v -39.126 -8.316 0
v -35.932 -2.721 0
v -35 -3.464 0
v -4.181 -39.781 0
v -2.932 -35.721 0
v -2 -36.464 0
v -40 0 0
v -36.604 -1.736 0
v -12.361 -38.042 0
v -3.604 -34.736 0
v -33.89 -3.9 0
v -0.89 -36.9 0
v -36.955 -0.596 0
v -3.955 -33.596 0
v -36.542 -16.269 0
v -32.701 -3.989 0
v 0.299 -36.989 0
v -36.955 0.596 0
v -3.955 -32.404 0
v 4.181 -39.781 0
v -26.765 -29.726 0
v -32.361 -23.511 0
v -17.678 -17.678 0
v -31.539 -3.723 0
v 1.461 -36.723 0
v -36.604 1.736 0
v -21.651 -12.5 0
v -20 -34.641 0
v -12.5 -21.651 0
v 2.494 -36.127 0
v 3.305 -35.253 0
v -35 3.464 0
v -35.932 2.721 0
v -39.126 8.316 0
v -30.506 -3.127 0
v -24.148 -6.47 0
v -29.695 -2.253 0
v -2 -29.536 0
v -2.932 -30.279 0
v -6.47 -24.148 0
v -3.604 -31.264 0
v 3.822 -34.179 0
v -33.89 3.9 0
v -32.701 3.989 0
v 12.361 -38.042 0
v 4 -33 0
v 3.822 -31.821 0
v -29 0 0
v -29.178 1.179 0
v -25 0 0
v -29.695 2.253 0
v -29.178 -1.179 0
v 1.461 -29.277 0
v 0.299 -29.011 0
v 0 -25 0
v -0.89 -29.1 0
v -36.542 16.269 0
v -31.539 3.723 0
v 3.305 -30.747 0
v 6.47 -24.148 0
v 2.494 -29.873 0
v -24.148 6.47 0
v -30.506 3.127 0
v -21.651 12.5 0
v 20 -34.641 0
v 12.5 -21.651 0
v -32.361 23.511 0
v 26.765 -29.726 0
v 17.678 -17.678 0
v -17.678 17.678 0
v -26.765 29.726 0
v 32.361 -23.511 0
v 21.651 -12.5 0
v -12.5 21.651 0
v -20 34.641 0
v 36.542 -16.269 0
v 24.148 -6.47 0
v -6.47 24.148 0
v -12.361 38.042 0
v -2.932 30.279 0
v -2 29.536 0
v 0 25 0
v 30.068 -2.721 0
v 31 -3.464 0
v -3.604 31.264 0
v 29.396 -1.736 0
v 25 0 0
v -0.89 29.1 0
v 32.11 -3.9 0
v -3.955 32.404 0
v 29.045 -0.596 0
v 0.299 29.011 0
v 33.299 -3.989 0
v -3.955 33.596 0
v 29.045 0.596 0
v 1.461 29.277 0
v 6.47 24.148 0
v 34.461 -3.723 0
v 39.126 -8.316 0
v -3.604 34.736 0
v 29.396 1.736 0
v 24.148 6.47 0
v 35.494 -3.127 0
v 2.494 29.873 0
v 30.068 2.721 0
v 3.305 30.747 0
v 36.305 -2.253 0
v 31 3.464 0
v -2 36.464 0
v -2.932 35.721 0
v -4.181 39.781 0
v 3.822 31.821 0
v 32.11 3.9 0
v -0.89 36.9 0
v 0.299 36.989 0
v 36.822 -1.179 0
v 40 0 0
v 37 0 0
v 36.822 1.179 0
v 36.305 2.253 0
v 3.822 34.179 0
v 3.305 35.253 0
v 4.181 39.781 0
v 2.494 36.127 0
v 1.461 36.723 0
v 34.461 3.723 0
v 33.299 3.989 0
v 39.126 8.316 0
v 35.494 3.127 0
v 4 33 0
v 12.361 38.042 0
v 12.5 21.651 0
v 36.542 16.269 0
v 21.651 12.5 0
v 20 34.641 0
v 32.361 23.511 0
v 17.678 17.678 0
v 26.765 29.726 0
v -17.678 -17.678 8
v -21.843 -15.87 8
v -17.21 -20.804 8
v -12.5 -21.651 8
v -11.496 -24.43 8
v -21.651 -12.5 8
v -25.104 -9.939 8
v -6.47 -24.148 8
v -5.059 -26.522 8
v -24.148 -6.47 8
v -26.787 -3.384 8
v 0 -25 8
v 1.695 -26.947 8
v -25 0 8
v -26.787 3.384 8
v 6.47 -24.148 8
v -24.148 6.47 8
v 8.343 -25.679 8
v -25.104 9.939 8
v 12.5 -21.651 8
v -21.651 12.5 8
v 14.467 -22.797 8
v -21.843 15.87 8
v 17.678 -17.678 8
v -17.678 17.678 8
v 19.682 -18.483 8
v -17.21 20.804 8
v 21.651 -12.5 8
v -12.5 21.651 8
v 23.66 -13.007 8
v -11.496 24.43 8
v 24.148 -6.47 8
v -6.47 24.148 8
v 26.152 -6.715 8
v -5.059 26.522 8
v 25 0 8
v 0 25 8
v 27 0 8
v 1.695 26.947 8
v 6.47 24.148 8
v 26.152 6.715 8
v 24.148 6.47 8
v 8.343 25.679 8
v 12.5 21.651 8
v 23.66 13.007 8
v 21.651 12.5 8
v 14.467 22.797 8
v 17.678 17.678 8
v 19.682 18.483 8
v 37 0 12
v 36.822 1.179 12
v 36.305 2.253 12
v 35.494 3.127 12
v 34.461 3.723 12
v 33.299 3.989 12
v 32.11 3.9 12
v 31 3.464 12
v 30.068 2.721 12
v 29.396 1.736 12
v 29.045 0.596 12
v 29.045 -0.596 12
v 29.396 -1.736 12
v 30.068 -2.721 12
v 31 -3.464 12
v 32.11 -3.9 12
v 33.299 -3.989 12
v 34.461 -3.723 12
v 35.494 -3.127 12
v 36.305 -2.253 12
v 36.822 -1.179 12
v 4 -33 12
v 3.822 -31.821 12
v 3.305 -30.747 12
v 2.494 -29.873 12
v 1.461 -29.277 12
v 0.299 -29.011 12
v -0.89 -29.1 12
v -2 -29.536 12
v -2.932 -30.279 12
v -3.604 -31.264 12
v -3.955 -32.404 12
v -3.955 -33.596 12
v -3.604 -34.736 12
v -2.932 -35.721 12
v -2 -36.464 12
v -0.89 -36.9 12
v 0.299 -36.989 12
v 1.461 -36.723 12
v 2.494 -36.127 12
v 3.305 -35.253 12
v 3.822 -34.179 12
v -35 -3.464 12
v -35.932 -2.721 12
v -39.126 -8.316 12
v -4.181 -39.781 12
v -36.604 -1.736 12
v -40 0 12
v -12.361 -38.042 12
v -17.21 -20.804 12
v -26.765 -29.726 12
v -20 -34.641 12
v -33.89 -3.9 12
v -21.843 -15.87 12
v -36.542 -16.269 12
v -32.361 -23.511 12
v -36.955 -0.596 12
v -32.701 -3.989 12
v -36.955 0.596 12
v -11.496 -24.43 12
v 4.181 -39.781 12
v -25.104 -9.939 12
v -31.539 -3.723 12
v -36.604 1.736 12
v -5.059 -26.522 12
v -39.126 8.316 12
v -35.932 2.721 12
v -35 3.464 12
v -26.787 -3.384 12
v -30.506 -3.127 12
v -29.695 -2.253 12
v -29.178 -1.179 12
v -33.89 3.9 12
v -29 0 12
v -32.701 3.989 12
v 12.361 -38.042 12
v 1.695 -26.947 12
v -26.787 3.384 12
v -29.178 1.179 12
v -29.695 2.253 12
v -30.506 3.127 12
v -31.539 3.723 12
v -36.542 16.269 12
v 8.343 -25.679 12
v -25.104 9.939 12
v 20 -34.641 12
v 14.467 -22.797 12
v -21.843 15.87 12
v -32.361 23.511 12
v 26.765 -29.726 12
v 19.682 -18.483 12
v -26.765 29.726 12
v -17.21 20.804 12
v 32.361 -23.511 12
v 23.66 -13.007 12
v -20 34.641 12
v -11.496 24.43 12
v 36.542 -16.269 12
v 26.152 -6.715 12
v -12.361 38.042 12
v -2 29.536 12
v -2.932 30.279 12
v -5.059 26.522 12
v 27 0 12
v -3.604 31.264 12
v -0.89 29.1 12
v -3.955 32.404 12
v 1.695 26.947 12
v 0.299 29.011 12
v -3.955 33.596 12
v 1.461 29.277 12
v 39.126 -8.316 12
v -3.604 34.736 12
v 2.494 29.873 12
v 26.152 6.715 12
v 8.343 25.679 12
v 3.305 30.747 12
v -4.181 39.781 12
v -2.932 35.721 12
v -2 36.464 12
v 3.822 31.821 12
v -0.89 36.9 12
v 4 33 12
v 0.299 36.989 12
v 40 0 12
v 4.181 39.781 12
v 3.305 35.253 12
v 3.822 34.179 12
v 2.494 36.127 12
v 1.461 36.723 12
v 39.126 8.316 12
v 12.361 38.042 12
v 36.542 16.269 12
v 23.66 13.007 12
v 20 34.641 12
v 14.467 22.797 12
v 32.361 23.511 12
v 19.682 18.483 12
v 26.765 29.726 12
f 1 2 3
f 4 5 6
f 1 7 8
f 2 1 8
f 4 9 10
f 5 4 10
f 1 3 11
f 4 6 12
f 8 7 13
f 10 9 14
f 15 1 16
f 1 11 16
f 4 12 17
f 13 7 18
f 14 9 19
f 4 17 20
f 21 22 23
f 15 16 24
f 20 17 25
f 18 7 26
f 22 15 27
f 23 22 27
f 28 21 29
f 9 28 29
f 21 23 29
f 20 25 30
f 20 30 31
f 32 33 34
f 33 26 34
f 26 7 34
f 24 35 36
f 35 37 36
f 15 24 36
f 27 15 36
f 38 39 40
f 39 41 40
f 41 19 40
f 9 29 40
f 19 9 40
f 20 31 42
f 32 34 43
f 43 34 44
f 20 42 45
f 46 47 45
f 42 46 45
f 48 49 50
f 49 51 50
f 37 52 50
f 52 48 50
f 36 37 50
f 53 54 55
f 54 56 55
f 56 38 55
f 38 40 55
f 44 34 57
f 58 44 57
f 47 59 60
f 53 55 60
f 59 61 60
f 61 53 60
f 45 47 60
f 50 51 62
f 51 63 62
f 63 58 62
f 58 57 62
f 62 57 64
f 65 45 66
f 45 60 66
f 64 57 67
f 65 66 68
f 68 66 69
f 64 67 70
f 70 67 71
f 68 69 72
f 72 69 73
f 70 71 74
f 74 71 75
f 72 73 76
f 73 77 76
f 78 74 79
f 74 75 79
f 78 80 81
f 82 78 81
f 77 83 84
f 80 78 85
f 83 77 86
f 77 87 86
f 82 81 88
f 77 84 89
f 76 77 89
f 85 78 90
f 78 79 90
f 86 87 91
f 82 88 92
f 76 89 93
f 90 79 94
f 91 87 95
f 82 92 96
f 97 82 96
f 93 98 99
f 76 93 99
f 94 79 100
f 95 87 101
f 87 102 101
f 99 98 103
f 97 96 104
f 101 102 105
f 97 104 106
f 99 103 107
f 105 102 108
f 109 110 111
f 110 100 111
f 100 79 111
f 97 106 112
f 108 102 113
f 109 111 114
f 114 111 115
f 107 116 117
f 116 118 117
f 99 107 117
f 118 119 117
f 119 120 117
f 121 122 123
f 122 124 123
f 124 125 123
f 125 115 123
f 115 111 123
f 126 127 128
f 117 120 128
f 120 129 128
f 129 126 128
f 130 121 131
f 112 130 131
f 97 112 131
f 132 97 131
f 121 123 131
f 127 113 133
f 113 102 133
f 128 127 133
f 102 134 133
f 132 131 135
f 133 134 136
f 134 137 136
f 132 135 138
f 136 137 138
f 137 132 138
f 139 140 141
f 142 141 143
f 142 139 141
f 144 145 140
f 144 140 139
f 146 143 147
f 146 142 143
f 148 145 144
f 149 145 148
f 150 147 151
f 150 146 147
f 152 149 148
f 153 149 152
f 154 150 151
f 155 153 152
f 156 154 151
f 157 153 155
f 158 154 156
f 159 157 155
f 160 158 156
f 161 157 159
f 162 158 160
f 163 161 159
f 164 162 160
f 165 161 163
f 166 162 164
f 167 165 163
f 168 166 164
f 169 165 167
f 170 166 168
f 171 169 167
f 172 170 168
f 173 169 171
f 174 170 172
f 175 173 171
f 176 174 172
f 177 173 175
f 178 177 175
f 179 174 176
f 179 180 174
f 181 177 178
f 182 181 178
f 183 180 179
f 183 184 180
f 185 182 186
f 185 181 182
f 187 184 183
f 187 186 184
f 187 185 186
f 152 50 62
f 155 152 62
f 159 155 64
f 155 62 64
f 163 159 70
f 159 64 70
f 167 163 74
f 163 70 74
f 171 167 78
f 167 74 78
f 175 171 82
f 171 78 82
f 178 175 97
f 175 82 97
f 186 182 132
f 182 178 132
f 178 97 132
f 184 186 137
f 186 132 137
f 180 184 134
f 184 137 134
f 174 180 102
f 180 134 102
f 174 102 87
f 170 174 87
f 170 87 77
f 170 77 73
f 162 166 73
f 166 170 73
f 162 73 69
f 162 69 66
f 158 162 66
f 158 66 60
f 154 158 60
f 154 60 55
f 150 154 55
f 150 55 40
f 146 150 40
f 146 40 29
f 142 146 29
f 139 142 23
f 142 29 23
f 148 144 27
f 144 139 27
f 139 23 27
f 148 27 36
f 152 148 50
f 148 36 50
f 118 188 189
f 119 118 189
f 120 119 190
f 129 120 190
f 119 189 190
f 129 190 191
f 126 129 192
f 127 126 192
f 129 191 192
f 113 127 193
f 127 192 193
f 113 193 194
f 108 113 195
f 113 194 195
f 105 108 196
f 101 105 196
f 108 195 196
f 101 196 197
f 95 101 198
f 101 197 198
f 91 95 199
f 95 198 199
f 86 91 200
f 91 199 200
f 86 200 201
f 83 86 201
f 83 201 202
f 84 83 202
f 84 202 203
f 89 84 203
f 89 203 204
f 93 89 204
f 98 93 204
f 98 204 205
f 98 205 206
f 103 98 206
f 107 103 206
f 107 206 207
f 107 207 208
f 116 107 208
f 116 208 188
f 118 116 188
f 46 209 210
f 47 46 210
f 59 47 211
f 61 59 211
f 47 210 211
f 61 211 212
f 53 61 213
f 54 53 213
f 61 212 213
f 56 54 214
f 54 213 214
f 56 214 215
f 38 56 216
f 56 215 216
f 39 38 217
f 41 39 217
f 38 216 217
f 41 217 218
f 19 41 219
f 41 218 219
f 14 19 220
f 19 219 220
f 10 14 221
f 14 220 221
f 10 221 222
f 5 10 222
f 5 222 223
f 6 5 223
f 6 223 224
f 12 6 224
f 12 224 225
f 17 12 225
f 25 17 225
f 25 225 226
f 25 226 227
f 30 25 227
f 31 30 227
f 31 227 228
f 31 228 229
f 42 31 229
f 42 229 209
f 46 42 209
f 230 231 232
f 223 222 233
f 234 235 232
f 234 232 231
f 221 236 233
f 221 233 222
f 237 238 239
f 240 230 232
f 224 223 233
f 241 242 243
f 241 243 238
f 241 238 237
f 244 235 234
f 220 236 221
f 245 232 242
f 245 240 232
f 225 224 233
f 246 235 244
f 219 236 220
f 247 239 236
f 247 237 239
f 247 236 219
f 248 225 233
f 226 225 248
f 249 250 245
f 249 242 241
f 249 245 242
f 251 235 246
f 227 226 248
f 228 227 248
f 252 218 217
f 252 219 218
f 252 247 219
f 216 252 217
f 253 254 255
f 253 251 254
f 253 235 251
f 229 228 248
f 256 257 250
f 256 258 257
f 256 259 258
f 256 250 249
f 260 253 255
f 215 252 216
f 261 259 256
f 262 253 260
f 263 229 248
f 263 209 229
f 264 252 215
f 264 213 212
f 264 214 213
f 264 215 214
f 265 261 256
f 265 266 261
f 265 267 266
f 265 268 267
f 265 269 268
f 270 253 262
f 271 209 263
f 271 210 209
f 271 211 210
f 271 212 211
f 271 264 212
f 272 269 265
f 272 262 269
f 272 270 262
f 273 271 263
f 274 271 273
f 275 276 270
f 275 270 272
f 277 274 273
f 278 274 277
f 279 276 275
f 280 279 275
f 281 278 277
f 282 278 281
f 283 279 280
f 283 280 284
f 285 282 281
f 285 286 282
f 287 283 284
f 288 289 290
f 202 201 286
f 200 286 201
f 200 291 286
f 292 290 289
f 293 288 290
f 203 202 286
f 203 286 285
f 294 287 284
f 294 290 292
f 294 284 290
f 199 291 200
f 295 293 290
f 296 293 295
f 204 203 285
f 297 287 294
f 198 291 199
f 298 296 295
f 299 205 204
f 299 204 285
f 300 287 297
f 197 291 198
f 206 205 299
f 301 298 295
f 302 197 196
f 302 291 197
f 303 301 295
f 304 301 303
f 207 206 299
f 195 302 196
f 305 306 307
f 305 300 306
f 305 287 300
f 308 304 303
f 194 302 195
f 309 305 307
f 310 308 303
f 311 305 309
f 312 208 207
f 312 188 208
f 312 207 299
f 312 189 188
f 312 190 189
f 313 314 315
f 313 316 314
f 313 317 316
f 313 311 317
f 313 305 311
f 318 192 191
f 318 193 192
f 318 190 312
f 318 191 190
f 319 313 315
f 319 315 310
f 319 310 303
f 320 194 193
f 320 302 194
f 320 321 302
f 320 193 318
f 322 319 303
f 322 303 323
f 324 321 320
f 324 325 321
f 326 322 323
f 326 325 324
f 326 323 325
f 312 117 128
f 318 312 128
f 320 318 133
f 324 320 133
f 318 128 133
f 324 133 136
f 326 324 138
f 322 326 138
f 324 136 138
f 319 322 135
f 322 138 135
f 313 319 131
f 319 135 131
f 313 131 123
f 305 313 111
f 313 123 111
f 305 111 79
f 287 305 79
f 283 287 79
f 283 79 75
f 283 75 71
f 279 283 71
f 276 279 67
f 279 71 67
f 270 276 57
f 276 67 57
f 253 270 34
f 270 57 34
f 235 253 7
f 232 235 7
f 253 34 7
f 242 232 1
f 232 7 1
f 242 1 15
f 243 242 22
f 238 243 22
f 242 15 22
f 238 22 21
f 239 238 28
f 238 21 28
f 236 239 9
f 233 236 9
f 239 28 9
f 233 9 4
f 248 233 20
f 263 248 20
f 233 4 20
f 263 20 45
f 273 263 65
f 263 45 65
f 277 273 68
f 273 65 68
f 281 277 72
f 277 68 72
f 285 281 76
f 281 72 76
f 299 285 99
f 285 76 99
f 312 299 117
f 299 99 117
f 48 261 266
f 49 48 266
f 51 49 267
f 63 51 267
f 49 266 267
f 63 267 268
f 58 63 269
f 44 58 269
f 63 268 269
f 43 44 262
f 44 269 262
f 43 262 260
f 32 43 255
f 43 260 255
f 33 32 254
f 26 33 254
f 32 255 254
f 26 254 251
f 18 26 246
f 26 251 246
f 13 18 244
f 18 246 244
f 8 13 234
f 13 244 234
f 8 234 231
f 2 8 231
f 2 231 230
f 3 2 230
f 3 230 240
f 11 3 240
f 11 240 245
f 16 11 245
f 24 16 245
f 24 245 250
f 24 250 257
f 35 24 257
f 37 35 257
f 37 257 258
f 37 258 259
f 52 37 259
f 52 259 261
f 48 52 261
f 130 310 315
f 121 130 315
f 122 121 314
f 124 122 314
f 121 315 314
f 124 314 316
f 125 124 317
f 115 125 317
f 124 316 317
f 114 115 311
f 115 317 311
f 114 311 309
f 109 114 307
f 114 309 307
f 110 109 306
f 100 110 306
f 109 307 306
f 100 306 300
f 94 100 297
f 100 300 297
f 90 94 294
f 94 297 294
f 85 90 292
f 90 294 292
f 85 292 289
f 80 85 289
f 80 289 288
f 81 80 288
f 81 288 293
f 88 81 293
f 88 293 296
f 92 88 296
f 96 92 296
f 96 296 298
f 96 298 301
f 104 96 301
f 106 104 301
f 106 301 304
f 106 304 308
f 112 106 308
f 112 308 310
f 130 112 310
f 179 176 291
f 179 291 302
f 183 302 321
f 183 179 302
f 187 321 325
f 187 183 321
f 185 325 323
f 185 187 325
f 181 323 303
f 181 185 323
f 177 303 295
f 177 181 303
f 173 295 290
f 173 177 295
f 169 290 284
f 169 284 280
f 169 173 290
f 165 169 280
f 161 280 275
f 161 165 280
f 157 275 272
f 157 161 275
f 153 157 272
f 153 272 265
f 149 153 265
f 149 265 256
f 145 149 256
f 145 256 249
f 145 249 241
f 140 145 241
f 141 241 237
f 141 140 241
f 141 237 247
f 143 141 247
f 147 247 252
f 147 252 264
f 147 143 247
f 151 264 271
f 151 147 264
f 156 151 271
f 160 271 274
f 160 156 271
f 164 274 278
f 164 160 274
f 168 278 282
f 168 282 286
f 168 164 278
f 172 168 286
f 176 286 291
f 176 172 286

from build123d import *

# Parameters (mm, degrees)
SKETCH1_R           = 40
BOSS_EXTRUDE1_DEPTH = 12
SKETCH2_R           = 25
CUT_EXTRUDE1_DEPTH  = 58.827329179
SKETCH3_R           = 4
CUT_EXTRUDE2_DEPTH  = 58.827329179
CUT_EXTRUDE3_START  = -4
SKETCH4_R           = 27
SKETCH4_R_2         = 25
CUT_EXTRUDE3_DEPTH  = 4


with BuildPart() as part:
    # Sketch1 → Boss-Extrude1 (new body)
    with BuildSketch(Plane.XY):
        Circle(SKETCH1_R)
    extrude(amount=BOSS_EXTRUDE1_DEPTH)

    # Sketch2 → Cut-Extrude1 (cut, through all)
    with BuildSketch(Plane(origin=(0, 0, 0), x_dir=(-1, 0, 0), z_dir=(0, 0, -1))):
        Circle(SKETCH2_R)
    extrude(amount=-CUT_EXTRUDE1_DEPTH, mode=Mode.SUBTRACT)

    # Sketch3 → Cut-Extrude2 (cut, through all)
    with BuildSketch(Plane.XY.offset(12)):
        with Locations((-33, 0)):
            Circle(SKETCH3_R)
        with Locations((0, 33)):
            Circle(SKETCH3_R)
        with Locations((33, 0)):
            Circle(SKETCH3_R)
        with Locations((0, -33)):
            Circle(SKETCH3_R)
    extrude(amount=-CUT_EXTRUDE2_DEPTH, mode=Mode.SUBTRACT)

    # Sketch4 → Cut-Extrude3 (cut)
    with BuildSketch(Plane.XY.offset(12).offset(CUT_EXTRUDE3_START)):
        Circle(SKETCH4_R)
        with Locations(Location((0, 0, 0), (0, 0, 180))):
            Circle(SKETCH4_R_2, mode=Mode.SUBTRACT)
    extrude(amount=CUT_EXTRUDE3_DEPTH, mode=Mode.SUBTRACT)


solid = part.part
